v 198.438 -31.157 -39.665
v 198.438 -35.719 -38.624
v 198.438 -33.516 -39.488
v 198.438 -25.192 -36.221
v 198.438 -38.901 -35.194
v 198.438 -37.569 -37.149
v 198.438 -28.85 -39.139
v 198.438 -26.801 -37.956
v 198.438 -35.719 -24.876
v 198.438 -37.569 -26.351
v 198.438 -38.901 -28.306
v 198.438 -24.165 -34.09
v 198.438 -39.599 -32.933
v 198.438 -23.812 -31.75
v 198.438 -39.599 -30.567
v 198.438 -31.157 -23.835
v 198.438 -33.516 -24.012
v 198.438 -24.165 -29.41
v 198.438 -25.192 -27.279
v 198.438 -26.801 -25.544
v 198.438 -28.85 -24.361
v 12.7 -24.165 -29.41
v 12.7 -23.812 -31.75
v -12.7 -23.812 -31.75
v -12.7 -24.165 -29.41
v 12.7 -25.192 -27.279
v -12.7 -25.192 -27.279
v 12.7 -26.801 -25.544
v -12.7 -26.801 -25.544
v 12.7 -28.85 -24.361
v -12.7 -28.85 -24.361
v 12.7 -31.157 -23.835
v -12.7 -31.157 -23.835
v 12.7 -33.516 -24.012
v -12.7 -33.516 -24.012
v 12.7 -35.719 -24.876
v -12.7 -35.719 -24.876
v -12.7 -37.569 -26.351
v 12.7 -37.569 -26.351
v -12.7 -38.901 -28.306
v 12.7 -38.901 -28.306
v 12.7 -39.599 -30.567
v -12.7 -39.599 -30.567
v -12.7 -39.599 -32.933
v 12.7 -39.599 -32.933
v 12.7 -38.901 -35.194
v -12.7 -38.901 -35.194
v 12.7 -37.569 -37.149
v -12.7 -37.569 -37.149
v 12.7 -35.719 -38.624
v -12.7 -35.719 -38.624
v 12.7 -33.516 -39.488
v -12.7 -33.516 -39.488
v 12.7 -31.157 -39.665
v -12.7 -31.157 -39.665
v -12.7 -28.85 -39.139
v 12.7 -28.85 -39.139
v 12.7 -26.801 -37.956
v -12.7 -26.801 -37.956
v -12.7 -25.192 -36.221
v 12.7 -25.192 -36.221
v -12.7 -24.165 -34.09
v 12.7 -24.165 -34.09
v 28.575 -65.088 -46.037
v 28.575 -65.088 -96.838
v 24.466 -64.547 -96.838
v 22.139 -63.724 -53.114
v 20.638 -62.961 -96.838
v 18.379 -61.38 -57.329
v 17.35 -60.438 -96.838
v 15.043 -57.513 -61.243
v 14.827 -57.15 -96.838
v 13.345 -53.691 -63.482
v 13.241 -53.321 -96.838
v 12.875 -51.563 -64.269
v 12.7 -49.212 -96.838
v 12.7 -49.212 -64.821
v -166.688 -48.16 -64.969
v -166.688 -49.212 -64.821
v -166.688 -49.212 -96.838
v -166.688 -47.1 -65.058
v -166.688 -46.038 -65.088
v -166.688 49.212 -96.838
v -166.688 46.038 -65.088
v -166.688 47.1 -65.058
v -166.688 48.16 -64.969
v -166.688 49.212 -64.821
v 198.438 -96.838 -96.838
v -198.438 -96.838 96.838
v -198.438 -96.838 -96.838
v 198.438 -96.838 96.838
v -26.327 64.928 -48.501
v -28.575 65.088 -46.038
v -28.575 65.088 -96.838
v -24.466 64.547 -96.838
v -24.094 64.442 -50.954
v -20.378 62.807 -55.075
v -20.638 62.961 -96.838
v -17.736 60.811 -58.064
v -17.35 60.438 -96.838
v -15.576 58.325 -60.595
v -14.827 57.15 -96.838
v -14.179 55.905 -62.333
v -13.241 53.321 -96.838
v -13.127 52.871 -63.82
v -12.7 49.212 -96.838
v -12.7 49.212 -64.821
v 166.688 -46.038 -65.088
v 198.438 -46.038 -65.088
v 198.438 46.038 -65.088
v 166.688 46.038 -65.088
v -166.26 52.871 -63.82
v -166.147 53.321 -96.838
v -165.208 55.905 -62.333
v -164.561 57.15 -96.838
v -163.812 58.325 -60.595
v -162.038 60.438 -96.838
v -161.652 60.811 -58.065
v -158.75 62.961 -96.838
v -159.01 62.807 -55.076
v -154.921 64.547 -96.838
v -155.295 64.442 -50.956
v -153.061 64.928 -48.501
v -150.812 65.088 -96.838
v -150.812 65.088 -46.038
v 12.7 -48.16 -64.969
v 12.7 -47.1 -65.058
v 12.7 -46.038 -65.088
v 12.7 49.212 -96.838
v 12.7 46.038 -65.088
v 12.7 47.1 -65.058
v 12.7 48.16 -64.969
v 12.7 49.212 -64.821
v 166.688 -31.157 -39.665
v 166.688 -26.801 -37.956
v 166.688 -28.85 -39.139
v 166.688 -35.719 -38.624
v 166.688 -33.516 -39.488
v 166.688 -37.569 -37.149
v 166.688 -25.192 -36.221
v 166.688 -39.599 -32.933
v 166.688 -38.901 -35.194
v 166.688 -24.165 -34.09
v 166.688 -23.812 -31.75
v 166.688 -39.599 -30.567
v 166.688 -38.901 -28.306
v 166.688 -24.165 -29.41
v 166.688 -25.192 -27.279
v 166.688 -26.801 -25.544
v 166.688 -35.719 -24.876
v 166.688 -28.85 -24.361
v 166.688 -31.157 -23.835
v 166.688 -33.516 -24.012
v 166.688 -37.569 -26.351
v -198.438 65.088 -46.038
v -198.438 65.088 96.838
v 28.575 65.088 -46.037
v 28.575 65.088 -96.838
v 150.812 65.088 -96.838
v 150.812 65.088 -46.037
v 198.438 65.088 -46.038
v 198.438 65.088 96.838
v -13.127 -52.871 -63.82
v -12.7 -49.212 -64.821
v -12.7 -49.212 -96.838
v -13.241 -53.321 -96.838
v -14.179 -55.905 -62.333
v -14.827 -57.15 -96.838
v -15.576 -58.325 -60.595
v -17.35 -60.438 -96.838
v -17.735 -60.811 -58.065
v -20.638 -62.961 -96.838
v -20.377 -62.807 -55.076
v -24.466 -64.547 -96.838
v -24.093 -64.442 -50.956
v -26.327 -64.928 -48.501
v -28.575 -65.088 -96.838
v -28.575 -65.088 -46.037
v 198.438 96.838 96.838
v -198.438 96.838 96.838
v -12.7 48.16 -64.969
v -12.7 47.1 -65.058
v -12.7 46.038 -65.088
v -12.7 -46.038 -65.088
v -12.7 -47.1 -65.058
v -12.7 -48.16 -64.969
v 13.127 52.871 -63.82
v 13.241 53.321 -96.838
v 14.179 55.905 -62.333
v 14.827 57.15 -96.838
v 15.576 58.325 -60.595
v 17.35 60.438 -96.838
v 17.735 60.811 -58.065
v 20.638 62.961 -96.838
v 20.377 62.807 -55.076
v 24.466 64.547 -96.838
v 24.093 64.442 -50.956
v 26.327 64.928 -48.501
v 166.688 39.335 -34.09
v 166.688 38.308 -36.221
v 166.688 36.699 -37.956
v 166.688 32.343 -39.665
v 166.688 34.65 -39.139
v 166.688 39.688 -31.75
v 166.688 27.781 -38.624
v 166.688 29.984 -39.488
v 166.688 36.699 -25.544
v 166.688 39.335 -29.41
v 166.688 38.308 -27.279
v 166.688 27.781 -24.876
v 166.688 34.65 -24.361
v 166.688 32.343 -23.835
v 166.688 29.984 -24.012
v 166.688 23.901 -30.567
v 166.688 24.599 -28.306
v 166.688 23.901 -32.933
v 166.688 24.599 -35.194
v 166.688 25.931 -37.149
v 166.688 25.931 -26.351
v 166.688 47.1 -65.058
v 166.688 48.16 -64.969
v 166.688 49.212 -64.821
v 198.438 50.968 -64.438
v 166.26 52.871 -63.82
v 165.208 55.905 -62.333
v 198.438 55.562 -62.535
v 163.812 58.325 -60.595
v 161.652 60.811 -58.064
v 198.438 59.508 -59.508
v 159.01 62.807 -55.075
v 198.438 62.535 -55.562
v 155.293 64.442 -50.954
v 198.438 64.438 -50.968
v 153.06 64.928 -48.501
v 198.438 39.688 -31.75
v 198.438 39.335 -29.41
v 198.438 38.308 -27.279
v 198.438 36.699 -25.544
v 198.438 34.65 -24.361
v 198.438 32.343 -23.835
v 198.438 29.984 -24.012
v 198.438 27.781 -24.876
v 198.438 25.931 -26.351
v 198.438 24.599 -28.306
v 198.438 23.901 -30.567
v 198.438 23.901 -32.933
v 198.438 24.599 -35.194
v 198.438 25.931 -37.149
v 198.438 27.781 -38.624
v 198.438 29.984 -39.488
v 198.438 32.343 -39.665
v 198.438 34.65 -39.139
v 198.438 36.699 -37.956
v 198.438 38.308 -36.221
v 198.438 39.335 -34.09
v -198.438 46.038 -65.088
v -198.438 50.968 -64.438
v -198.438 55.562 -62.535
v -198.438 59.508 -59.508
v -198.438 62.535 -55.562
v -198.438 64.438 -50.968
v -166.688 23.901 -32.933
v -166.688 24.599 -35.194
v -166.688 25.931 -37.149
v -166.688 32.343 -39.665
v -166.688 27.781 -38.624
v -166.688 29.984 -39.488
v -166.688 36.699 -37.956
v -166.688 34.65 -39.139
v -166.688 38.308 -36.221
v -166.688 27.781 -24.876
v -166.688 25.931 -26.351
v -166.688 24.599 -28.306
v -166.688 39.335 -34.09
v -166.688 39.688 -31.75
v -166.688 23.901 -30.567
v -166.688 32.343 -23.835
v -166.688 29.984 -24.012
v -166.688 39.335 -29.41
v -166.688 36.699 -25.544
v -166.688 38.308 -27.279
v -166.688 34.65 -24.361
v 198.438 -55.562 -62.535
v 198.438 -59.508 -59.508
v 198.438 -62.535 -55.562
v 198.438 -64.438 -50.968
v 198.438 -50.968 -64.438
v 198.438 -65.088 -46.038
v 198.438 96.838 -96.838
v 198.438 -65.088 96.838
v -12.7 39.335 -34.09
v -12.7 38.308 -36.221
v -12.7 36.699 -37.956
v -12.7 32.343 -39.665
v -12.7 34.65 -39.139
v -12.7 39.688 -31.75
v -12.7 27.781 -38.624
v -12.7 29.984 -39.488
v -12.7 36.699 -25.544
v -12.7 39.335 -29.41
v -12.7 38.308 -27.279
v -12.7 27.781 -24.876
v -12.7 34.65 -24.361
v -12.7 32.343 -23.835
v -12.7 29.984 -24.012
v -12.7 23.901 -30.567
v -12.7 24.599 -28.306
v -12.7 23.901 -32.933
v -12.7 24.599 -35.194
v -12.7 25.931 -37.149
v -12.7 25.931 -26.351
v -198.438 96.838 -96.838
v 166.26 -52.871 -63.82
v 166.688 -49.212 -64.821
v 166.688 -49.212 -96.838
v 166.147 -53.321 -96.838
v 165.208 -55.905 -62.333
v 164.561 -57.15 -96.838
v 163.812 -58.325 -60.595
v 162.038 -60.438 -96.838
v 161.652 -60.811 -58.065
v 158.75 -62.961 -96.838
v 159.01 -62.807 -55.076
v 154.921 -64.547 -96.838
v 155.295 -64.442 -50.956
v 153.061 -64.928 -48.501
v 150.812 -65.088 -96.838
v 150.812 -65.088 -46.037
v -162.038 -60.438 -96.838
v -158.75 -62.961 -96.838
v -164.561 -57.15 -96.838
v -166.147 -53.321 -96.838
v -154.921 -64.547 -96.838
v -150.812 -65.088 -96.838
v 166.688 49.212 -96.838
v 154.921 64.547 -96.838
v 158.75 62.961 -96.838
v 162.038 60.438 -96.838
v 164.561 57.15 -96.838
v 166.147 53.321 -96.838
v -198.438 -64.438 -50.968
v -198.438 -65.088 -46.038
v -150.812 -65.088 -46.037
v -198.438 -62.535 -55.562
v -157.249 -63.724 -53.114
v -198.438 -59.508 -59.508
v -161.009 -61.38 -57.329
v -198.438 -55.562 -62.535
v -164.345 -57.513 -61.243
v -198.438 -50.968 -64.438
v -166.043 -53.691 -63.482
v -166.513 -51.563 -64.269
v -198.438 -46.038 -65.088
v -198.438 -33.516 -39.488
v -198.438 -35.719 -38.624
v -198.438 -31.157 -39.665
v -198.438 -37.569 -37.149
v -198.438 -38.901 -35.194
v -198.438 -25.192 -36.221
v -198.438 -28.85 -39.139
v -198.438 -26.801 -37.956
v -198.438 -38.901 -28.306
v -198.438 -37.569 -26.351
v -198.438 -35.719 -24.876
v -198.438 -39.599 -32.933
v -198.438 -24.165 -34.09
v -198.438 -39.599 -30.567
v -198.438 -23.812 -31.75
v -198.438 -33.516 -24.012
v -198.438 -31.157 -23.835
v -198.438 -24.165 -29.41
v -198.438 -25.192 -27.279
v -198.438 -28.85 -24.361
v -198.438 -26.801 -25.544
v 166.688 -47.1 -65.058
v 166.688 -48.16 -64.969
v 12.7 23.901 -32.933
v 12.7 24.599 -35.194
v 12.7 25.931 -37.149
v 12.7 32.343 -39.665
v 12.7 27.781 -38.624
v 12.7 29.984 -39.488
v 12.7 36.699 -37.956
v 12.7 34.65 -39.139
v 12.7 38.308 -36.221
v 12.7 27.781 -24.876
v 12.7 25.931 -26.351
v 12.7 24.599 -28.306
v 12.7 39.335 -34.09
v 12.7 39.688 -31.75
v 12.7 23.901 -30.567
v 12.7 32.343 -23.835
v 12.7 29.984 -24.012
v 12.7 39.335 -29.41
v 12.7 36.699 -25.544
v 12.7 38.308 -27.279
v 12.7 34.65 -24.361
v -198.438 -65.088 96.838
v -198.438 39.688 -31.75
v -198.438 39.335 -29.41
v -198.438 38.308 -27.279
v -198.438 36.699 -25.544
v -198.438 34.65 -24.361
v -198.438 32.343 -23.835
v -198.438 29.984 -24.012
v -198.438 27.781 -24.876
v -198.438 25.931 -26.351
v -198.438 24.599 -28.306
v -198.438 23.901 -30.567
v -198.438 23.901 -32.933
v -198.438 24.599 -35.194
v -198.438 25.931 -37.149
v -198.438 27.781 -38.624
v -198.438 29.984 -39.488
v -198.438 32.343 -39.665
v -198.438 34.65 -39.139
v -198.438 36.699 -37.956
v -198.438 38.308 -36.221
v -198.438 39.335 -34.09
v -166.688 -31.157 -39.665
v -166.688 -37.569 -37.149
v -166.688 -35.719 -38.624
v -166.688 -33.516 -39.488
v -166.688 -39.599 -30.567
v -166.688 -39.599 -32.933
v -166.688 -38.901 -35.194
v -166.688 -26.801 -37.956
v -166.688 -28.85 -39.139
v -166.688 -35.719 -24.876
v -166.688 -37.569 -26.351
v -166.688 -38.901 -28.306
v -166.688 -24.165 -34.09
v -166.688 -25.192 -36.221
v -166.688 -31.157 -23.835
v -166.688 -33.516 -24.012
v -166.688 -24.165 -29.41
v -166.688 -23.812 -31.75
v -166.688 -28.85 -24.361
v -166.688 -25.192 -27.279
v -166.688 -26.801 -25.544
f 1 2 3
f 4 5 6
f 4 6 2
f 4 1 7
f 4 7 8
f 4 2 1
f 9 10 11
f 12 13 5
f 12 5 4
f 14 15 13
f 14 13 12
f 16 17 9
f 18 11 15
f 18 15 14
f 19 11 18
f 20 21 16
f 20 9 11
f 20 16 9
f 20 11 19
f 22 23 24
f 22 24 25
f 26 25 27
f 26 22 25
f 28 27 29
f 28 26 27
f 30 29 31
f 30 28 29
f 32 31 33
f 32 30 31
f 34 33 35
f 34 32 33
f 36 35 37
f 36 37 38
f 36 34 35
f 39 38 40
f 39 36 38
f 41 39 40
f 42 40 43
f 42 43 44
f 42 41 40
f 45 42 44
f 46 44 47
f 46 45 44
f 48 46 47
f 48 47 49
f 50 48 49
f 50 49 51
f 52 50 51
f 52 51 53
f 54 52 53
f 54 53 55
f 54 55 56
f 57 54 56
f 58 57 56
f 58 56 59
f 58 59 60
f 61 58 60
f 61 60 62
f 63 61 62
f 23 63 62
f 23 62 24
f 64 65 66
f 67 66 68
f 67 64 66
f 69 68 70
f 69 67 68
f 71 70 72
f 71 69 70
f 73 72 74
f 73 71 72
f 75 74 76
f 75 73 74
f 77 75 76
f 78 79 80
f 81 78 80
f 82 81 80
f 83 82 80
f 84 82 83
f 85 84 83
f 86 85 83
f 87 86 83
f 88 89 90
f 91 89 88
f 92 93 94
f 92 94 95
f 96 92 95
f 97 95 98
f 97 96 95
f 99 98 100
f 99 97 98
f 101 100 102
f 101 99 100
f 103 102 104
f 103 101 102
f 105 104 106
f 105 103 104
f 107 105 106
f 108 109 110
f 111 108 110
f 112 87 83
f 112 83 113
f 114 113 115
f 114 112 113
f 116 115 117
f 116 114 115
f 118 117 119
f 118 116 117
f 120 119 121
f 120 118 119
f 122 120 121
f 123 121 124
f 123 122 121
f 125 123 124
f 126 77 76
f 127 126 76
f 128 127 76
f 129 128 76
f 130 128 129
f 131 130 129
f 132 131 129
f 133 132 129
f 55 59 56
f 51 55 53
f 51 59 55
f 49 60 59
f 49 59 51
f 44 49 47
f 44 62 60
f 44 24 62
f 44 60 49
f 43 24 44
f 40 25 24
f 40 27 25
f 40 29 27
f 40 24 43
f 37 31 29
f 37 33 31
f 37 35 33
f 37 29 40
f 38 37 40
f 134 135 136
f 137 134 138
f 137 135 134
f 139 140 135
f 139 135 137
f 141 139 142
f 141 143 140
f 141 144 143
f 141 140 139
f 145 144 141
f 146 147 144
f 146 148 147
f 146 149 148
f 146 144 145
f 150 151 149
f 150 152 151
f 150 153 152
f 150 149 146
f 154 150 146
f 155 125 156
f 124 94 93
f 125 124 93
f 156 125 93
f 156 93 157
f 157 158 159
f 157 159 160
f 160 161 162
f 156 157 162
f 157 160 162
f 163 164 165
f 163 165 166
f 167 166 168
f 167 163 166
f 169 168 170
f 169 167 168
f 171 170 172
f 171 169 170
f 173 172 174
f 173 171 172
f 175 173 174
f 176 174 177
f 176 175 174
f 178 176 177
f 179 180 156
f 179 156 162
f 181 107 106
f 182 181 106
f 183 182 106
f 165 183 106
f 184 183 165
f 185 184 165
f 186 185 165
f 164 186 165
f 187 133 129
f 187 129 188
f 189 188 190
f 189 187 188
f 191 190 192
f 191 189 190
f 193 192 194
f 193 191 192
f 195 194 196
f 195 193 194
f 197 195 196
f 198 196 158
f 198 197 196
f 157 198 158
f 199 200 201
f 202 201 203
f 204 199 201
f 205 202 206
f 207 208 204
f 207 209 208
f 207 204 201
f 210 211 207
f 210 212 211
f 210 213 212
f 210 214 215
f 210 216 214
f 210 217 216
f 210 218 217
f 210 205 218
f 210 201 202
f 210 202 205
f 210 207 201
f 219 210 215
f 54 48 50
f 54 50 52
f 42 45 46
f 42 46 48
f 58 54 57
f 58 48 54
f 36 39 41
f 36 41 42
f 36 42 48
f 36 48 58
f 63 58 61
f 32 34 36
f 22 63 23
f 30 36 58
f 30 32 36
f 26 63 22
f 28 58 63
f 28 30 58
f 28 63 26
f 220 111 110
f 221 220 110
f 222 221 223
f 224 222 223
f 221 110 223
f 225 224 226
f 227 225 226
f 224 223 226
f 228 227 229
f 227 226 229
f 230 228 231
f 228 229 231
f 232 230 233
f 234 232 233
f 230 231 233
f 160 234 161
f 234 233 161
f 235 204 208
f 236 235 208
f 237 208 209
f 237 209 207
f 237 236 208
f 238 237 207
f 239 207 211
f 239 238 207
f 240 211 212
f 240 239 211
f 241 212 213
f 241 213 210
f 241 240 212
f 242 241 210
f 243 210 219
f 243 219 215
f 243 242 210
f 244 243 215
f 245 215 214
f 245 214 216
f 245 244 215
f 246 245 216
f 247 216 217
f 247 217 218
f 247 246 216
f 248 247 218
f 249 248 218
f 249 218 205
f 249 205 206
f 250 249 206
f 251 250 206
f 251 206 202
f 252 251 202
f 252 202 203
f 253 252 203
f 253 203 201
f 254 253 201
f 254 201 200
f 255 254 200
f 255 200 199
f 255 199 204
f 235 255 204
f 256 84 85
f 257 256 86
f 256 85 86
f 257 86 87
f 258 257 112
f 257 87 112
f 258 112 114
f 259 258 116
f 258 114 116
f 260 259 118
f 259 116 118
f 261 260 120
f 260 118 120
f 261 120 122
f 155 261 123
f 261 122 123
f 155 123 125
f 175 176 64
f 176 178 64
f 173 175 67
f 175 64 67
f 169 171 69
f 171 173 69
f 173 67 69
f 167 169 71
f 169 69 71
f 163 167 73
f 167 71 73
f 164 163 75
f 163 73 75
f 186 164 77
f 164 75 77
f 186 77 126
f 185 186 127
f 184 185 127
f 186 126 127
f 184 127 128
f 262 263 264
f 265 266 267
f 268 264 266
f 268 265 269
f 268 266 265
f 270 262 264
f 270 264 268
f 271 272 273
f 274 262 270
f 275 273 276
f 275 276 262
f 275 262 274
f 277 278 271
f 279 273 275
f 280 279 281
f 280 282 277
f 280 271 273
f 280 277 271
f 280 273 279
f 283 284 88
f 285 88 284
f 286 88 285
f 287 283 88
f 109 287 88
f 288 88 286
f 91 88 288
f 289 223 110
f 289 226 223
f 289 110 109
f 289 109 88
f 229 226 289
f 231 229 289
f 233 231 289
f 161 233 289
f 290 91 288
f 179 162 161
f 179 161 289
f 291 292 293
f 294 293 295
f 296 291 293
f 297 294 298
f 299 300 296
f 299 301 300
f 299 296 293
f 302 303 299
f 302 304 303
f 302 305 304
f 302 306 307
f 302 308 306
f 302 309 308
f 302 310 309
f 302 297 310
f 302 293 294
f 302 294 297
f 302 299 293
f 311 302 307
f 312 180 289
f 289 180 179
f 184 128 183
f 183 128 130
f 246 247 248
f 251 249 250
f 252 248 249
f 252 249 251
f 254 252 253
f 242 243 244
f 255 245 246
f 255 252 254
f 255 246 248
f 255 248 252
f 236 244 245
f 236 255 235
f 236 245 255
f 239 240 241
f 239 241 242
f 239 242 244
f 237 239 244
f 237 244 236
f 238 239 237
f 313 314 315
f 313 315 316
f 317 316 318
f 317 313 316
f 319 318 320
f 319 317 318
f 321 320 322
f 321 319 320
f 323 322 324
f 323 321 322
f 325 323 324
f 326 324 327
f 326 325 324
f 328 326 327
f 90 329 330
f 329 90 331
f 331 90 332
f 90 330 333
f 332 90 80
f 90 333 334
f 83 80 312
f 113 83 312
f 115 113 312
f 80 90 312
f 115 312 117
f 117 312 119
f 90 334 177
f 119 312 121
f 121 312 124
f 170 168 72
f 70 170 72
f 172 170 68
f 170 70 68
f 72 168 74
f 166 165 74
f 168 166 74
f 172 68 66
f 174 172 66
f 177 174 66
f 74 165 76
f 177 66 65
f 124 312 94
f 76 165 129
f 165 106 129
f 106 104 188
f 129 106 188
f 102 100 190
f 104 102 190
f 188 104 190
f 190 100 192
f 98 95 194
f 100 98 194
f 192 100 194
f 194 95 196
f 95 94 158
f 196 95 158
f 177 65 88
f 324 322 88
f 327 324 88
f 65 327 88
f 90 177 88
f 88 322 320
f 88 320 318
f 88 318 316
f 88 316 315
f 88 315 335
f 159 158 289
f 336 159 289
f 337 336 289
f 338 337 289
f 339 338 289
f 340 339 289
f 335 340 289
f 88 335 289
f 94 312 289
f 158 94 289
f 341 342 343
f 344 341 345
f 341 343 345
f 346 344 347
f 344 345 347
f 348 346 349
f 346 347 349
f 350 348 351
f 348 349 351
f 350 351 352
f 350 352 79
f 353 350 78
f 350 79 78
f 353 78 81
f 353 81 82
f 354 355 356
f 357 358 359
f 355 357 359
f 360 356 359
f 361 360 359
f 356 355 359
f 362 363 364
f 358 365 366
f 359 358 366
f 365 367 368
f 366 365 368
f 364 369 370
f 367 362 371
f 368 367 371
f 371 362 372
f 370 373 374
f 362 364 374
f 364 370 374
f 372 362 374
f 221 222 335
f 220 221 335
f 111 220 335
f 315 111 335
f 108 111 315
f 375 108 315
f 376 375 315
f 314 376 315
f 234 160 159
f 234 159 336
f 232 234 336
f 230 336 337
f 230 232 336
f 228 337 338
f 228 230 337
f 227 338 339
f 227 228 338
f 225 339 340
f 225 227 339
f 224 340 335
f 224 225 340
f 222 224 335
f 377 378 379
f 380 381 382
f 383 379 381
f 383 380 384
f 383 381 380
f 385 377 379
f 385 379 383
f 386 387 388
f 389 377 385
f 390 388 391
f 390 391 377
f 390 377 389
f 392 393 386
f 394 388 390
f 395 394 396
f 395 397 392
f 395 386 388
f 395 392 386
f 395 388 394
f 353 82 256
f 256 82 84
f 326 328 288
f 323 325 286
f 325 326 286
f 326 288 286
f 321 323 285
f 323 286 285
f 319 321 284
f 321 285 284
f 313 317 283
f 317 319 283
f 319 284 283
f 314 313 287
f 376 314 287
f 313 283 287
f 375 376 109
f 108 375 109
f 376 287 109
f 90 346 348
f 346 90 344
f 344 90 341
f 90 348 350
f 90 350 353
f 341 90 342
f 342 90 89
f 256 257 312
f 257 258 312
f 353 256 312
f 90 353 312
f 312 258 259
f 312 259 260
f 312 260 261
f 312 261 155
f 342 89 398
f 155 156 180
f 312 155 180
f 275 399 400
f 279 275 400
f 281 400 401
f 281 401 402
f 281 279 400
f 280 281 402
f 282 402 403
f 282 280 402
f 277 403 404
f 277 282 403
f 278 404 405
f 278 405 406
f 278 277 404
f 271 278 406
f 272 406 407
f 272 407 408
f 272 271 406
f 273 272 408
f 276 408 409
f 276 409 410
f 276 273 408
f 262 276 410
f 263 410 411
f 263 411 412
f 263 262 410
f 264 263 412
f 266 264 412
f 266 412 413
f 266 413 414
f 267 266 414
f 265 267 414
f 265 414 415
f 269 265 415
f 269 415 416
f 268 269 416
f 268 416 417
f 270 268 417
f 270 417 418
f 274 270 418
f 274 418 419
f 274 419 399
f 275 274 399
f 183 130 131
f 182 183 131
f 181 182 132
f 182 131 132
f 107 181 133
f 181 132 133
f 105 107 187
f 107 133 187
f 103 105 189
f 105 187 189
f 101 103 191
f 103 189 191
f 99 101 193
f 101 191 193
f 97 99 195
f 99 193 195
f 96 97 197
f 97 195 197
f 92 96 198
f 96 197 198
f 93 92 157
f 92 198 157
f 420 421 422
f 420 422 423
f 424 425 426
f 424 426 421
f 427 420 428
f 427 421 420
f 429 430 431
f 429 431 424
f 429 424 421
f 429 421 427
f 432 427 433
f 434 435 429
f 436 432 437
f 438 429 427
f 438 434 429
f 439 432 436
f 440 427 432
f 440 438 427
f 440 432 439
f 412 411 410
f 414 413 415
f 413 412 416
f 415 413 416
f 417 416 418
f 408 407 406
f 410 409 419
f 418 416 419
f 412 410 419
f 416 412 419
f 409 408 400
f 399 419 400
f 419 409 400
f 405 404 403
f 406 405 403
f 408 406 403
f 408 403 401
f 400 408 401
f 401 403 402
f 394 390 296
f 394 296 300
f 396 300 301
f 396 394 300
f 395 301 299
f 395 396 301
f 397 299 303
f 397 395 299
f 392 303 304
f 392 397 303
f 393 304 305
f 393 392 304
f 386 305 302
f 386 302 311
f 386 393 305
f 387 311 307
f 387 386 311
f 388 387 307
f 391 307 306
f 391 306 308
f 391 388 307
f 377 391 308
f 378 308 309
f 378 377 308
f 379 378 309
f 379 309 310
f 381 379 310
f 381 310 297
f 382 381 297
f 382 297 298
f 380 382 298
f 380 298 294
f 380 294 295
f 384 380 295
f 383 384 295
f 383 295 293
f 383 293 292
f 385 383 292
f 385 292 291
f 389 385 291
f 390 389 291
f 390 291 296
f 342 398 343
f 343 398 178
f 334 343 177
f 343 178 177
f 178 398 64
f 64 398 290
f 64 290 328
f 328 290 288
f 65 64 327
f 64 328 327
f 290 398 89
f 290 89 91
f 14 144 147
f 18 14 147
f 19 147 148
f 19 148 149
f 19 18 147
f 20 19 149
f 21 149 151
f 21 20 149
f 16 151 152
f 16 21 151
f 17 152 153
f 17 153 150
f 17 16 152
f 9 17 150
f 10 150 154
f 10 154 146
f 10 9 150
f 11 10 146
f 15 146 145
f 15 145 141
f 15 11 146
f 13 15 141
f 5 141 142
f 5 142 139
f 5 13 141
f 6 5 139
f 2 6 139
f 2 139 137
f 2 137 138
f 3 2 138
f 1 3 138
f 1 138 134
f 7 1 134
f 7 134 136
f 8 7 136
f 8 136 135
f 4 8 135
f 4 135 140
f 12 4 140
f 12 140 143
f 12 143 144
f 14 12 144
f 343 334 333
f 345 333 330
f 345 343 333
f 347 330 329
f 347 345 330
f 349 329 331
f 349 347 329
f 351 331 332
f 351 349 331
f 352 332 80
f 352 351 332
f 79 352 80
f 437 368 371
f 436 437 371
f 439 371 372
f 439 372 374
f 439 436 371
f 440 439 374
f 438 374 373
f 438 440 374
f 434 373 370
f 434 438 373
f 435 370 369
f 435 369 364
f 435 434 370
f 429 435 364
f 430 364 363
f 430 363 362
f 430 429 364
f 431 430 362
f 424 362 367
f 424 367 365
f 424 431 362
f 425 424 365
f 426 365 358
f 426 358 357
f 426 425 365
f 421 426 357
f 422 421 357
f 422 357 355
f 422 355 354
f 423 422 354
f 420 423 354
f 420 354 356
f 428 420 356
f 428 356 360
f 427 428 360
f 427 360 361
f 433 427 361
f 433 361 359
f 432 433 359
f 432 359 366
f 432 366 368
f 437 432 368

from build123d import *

# Parameters (mm, degrees)
F0_W     = 396.875
F0_H     = 193.675
F1_DEPTH = 96.8375
F2_R     = 7.9375
F3_DEPTH = 396.876


with BuildPart() as f1:
    # F0 (on Top) → F1 (new body, symmetric)
    with BuildSketch(Plane.XY):
        Rectangle(F0_W, F0_H)
        with BuildLine():
            ThreePointArc((-166.6875, 49.2125), (-162.0378201513, 60.4378201513), (-150.8125, 65.0875))
            Line((-150.8125, 65.0875), (-28.575, 65.0875))
            ThreePointArc((-28.575, 65.0875), (-17.3496798487, 60.4378201513), (-12.7, 49.2125))
            Line((-12.7, 49.2125), (-12.7, 0))
            Line((-12.7, 0), (-12.7, -49.2125))
            ThreePointArc((-12.7, -49.2125), (-17.3496798487, -60.4378201513), (-28.575, -65.0875))
            Line((-28.575, -65.0875), (-150.8125, -65.0875))
            ThreePointArc((-150.8125, -65.0875), (-162.0378201513, -60.4378201513), (-166.6875, -49.2125))
            Line((-166.6875, -49.2125), (-166.6875, 49.2125))
        make_face(mode=Mode.SUBTRACT)
        with BuildLine():
            Line((12.7, -49.2125), (12.7, 0))
            Line((12.7, 0), (12.7, 49.2125))
            ThreePointArc((12.7, 49.2125), (17.3496798487, 60.4378201513), (28.575, 65.0875))
            Line((28.575, 65.0875), (150.8125, 65.0875))
            ThreePointArc((150.8125, 65.0875), (162.0378201513, 60.4378201513), (166.6875, 49.2125))
            Line((166.6875, 49.2125), (166.6875, -49.2125))
            ThreePointArc((166.6875, -49.2125), (162.0378201513, -60.4378201513), (150.8125, -65.0875))
            Line((150.8125, -65.0875), (28.575, -65.0875))
            ThreePointArc((28.575, -65.0875), (17.3496798487, -60.4378201513), (12.7, -49.2125))
        make_face(mode=Mode.SUBTRACT)
    extrude(amount=F1_DEPTH, both=True)

    # F2 (on face) → F3 (cut, through all)
    with BuildSketch(Plane.YZ.offset(198.4375)):
        with BuildLine():
            Line((65.0875, 96.8375), (-65.0875, 96.8375))
            Line((-65.0875, 96.8375), (-65.0875, -46.0375))
            ThreePointArc((-65.0875, -46.0375), (-59.5078841816, -59.5078841816), (-46.0375, -65.0875))
            Line((-46.0375, -65.0875), (46.0375, -65.0875))
            ThreePointArc((46.0375, -65.0875), (59.5078841816, -59.5078841816), (65.0875, -46.0375))
            Line((65.0875, -46.0375), (65.0875, 96.8375))
        make_face()
        with Locations((-31.75, -31.75)):
            Circle(F2_R, mode=Mode.SUBTRACT)
        with Locations((31.75, -31.75)):
            Circle(F2_R, mode=Mode.SUBTRACT)
    extrude(amount=-F3_DEPTH, mode=Mode.SUBTRACT)


solid = f1.part
